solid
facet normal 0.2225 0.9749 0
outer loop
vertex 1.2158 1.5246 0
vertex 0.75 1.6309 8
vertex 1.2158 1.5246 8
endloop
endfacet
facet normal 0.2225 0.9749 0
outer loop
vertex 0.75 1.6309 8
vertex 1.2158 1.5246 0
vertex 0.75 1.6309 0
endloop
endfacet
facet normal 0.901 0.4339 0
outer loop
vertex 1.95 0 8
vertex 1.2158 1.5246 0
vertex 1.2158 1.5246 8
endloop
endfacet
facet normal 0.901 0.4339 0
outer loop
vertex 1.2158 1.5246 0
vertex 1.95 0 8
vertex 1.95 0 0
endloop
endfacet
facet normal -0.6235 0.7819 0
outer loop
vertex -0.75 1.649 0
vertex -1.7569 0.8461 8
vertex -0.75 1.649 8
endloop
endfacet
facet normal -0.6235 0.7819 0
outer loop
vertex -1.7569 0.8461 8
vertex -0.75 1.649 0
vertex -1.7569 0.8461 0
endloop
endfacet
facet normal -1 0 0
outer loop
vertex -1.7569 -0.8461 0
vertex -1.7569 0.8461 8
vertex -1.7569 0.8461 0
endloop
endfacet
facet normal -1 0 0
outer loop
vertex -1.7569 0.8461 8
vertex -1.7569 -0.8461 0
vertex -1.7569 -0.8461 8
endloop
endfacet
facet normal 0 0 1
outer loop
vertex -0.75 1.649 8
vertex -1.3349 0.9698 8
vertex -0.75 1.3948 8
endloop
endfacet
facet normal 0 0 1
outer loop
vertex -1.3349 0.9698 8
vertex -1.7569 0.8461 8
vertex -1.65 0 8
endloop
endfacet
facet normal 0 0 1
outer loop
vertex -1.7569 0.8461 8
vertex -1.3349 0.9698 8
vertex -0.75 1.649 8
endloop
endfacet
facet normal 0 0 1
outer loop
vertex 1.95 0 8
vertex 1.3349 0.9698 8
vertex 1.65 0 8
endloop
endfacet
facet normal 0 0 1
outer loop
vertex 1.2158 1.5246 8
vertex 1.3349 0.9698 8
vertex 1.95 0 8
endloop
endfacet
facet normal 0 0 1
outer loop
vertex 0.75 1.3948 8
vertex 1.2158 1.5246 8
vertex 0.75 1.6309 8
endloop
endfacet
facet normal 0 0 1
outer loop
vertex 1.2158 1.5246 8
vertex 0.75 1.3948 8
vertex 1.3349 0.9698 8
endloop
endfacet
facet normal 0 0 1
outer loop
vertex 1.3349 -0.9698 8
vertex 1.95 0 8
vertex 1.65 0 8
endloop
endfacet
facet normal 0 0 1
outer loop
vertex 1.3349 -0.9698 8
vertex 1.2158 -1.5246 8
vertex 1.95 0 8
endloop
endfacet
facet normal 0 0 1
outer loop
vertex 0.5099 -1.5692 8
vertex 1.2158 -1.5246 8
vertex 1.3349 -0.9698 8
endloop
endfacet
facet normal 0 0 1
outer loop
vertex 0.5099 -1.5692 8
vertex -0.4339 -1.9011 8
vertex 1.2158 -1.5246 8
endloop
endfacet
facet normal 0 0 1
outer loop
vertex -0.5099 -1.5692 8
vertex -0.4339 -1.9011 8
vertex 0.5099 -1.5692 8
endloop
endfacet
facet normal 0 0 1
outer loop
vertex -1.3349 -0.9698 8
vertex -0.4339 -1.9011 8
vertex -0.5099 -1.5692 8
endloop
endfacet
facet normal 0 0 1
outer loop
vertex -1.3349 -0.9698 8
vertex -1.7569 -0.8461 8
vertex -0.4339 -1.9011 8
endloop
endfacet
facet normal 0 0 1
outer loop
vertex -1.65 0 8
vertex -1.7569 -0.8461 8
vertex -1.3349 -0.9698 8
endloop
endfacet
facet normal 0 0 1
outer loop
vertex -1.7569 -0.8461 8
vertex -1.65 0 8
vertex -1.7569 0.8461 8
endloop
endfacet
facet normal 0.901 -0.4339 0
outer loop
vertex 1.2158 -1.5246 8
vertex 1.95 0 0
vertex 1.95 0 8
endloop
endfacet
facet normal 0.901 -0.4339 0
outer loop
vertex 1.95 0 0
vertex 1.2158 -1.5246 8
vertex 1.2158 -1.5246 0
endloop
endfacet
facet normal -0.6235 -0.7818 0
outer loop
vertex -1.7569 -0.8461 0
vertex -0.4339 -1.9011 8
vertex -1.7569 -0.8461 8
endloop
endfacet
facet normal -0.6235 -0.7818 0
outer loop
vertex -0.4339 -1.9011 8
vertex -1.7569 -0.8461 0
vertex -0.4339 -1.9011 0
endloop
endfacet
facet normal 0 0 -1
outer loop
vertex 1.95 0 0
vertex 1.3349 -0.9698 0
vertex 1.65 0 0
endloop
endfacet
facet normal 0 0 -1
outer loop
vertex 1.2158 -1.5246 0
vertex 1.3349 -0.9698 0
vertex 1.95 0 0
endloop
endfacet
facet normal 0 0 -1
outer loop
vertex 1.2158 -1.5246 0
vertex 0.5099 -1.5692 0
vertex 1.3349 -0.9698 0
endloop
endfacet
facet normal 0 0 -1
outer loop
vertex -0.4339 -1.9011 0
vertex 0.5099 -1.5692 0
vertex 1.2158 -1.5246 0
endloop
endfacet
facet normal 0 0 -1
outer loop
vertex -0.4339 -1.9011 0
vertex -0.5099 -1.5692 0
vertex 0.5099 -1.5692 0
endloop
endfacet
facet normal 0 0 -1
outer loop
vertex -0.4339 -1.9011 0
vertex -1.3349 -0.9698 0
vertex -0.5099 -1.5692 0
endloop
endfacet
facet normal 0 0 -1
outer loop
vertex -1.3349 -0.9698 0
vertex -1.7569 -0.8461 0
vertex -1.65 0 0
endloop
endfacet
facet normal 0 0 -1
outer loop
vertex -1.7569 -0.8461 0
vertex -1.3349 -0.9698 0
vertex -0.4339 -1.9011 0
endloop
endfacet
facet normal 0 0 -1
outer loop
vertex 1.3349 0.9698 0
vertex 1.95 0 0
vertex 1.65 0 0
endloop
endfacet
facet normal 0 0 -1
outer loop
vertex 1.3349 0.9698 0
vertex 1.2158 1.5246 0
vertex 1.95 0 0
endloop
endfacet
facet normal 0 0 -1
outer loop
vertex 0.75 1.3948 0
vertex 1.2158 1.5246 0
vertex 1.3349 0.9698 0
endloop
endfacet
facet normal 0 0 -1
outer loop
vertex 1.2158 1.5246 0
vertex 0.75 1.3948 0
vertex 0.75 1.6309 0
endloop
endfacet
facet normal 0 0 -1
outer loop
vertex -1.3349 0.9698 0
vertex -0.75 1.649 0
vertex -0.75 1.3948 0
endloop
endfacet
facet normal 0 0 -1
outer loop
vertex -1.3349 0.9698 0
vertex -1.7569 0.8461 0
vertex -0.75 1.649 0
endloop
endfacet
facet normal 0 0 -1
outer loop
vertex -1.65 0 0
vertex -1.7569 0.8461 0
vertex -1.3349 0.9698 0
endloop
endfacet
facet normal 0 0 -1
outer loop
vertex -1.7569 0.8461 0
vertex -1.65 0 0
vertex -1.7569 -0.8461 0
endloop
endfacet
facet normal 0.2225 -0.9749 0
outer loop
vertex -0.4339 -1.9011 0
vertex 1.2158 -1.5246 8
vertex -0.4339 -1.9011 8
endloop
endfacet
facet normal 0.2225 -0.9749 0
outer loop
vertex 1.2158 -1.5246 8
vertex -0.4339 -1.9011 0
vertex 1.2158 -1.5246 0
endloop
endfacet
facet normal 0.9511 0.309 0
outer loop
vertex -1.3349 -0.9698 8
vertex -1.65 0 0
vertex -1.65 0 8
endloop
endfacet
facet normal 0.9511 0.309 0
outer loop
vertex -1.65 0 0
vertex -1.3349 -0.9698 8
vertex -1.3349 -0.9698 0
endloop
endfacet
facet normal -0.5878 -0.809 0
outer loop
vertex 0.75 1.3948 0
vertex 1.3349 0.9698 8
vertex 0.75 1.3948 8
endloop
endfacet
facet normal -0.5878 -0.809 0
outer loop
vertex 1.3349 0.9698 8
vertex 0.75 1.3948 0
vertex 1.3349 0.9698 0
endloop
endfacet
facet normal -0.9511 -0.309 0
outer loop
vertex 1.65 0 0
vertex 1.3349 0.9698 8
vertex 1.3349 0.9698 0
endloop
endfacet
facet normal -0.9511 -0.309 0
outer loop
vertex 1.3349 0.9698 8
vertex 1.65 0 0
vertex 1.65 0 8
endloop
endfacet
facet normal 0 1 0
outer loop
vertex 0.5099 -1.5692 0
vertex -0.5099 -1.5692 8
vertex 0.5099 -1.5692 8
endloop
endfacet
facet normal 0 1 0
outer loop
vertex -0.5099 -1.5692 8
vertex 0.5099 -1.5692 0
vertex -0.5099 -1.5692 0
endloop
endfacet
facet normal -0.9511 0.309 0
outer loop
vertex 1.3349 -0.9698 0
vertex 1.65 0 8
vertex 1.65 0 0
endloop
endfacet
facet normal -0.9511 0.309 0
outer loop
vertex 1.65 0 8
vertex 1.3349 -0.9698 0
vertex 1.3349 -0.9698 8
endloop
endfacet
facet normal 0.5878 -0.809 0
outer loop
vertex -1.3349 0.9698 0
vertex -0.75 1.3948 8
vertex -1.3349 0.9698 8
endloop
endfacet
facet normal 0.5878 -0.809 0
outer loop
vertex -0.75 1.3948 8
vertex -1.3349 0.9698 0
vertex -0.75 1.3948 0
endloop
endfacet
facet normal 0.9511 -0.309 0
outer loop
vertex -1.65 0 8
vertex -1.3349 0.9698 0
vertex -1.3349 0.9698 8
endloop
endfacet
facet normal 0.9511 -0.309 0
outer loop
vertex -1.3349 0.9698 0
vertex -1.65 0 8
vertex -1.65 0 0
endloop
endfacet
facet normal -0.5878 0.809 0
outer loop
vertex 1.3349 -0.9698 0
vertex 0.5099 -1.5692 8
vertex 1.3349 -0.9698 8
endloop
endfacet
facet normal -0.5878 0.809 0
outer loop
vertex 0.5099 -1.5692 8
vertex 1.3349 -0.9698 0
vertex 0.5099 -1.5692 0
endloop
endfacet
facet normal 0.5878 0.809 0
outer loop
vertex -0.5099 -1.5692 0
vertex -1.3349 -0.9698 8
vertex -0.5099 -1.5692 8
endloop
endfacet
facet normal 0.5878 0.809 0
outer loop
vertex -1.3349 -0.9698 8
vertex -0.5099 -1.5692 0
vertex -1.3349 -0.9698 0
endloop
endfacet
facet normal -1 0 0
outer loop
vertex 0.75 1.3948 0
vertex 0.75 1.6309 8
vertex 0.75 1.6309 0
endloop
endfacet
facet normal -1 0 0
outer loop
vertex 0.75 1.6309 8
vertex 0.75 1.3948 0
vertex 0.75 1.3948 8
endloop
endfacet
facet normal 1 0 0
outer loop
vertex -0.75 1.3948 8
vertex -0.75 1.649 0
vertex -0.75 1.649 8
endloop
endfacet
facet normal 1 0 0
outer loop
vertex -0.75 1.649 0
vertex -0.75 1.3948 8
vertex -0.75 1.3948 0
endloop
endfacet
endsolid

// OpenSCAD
//module motor_mount () {
//    difference() {
//        // The $fn = 100 makes it circular, getting rid of it will make it hexagonal
//        translate([0, 0, -1]) {
//            cylinder(8, 2.15, 2.15); 
//        }
//        cylinder(20, 1.95, 1.95, center = true);
//        translate([-0.75, 0, -1]) {
//            cube([1.5, 10, 20]);
//        }   
//    }
//}
//
//
//// This is the box
//module hollow_enclosure () {
//    translate([0,0,4]) {
//        difference() {
//            // This is the outer layer of the box, length and width of 15 cm
//            cube([15, 15, 11], center = true);
//            translate ([0,0,1]) {
//                // This is the inner box that we subtract
//                cube([14.5, 14.5, 12], center = true);
//                }
//            
//        
//           translate ([-4,7,-3.5]) {
//                        // This is the small cube we get rid of to make the hole for power
//                        cube([3, 8, 3], center = true);
//            }
//       }
//    }
//}
//
//difference() {
//    difference(){
//        hollow_enclosure();
//        translate([0,0,0.5]) {
//            cylinder(5, 0.8, 1.65, center = true, $fn = 100);
//            }
//        }
//    translate([0,0,6]) {
//        cylinder(5, 1.4, 1.65, center = true, $fn = 100 );
//    }
//    }
//motor_mount();

difference(){
    cylinder(8, 1.95, 1.95, $fn = 7);
    translate([0,0,-1]){
        cylinder(20, 1.65, 1.65, $fn = 10);
    }
    translate([-0.75, 0, -1]) {
        cube([1.5, 10, 20]);
    }   
}
